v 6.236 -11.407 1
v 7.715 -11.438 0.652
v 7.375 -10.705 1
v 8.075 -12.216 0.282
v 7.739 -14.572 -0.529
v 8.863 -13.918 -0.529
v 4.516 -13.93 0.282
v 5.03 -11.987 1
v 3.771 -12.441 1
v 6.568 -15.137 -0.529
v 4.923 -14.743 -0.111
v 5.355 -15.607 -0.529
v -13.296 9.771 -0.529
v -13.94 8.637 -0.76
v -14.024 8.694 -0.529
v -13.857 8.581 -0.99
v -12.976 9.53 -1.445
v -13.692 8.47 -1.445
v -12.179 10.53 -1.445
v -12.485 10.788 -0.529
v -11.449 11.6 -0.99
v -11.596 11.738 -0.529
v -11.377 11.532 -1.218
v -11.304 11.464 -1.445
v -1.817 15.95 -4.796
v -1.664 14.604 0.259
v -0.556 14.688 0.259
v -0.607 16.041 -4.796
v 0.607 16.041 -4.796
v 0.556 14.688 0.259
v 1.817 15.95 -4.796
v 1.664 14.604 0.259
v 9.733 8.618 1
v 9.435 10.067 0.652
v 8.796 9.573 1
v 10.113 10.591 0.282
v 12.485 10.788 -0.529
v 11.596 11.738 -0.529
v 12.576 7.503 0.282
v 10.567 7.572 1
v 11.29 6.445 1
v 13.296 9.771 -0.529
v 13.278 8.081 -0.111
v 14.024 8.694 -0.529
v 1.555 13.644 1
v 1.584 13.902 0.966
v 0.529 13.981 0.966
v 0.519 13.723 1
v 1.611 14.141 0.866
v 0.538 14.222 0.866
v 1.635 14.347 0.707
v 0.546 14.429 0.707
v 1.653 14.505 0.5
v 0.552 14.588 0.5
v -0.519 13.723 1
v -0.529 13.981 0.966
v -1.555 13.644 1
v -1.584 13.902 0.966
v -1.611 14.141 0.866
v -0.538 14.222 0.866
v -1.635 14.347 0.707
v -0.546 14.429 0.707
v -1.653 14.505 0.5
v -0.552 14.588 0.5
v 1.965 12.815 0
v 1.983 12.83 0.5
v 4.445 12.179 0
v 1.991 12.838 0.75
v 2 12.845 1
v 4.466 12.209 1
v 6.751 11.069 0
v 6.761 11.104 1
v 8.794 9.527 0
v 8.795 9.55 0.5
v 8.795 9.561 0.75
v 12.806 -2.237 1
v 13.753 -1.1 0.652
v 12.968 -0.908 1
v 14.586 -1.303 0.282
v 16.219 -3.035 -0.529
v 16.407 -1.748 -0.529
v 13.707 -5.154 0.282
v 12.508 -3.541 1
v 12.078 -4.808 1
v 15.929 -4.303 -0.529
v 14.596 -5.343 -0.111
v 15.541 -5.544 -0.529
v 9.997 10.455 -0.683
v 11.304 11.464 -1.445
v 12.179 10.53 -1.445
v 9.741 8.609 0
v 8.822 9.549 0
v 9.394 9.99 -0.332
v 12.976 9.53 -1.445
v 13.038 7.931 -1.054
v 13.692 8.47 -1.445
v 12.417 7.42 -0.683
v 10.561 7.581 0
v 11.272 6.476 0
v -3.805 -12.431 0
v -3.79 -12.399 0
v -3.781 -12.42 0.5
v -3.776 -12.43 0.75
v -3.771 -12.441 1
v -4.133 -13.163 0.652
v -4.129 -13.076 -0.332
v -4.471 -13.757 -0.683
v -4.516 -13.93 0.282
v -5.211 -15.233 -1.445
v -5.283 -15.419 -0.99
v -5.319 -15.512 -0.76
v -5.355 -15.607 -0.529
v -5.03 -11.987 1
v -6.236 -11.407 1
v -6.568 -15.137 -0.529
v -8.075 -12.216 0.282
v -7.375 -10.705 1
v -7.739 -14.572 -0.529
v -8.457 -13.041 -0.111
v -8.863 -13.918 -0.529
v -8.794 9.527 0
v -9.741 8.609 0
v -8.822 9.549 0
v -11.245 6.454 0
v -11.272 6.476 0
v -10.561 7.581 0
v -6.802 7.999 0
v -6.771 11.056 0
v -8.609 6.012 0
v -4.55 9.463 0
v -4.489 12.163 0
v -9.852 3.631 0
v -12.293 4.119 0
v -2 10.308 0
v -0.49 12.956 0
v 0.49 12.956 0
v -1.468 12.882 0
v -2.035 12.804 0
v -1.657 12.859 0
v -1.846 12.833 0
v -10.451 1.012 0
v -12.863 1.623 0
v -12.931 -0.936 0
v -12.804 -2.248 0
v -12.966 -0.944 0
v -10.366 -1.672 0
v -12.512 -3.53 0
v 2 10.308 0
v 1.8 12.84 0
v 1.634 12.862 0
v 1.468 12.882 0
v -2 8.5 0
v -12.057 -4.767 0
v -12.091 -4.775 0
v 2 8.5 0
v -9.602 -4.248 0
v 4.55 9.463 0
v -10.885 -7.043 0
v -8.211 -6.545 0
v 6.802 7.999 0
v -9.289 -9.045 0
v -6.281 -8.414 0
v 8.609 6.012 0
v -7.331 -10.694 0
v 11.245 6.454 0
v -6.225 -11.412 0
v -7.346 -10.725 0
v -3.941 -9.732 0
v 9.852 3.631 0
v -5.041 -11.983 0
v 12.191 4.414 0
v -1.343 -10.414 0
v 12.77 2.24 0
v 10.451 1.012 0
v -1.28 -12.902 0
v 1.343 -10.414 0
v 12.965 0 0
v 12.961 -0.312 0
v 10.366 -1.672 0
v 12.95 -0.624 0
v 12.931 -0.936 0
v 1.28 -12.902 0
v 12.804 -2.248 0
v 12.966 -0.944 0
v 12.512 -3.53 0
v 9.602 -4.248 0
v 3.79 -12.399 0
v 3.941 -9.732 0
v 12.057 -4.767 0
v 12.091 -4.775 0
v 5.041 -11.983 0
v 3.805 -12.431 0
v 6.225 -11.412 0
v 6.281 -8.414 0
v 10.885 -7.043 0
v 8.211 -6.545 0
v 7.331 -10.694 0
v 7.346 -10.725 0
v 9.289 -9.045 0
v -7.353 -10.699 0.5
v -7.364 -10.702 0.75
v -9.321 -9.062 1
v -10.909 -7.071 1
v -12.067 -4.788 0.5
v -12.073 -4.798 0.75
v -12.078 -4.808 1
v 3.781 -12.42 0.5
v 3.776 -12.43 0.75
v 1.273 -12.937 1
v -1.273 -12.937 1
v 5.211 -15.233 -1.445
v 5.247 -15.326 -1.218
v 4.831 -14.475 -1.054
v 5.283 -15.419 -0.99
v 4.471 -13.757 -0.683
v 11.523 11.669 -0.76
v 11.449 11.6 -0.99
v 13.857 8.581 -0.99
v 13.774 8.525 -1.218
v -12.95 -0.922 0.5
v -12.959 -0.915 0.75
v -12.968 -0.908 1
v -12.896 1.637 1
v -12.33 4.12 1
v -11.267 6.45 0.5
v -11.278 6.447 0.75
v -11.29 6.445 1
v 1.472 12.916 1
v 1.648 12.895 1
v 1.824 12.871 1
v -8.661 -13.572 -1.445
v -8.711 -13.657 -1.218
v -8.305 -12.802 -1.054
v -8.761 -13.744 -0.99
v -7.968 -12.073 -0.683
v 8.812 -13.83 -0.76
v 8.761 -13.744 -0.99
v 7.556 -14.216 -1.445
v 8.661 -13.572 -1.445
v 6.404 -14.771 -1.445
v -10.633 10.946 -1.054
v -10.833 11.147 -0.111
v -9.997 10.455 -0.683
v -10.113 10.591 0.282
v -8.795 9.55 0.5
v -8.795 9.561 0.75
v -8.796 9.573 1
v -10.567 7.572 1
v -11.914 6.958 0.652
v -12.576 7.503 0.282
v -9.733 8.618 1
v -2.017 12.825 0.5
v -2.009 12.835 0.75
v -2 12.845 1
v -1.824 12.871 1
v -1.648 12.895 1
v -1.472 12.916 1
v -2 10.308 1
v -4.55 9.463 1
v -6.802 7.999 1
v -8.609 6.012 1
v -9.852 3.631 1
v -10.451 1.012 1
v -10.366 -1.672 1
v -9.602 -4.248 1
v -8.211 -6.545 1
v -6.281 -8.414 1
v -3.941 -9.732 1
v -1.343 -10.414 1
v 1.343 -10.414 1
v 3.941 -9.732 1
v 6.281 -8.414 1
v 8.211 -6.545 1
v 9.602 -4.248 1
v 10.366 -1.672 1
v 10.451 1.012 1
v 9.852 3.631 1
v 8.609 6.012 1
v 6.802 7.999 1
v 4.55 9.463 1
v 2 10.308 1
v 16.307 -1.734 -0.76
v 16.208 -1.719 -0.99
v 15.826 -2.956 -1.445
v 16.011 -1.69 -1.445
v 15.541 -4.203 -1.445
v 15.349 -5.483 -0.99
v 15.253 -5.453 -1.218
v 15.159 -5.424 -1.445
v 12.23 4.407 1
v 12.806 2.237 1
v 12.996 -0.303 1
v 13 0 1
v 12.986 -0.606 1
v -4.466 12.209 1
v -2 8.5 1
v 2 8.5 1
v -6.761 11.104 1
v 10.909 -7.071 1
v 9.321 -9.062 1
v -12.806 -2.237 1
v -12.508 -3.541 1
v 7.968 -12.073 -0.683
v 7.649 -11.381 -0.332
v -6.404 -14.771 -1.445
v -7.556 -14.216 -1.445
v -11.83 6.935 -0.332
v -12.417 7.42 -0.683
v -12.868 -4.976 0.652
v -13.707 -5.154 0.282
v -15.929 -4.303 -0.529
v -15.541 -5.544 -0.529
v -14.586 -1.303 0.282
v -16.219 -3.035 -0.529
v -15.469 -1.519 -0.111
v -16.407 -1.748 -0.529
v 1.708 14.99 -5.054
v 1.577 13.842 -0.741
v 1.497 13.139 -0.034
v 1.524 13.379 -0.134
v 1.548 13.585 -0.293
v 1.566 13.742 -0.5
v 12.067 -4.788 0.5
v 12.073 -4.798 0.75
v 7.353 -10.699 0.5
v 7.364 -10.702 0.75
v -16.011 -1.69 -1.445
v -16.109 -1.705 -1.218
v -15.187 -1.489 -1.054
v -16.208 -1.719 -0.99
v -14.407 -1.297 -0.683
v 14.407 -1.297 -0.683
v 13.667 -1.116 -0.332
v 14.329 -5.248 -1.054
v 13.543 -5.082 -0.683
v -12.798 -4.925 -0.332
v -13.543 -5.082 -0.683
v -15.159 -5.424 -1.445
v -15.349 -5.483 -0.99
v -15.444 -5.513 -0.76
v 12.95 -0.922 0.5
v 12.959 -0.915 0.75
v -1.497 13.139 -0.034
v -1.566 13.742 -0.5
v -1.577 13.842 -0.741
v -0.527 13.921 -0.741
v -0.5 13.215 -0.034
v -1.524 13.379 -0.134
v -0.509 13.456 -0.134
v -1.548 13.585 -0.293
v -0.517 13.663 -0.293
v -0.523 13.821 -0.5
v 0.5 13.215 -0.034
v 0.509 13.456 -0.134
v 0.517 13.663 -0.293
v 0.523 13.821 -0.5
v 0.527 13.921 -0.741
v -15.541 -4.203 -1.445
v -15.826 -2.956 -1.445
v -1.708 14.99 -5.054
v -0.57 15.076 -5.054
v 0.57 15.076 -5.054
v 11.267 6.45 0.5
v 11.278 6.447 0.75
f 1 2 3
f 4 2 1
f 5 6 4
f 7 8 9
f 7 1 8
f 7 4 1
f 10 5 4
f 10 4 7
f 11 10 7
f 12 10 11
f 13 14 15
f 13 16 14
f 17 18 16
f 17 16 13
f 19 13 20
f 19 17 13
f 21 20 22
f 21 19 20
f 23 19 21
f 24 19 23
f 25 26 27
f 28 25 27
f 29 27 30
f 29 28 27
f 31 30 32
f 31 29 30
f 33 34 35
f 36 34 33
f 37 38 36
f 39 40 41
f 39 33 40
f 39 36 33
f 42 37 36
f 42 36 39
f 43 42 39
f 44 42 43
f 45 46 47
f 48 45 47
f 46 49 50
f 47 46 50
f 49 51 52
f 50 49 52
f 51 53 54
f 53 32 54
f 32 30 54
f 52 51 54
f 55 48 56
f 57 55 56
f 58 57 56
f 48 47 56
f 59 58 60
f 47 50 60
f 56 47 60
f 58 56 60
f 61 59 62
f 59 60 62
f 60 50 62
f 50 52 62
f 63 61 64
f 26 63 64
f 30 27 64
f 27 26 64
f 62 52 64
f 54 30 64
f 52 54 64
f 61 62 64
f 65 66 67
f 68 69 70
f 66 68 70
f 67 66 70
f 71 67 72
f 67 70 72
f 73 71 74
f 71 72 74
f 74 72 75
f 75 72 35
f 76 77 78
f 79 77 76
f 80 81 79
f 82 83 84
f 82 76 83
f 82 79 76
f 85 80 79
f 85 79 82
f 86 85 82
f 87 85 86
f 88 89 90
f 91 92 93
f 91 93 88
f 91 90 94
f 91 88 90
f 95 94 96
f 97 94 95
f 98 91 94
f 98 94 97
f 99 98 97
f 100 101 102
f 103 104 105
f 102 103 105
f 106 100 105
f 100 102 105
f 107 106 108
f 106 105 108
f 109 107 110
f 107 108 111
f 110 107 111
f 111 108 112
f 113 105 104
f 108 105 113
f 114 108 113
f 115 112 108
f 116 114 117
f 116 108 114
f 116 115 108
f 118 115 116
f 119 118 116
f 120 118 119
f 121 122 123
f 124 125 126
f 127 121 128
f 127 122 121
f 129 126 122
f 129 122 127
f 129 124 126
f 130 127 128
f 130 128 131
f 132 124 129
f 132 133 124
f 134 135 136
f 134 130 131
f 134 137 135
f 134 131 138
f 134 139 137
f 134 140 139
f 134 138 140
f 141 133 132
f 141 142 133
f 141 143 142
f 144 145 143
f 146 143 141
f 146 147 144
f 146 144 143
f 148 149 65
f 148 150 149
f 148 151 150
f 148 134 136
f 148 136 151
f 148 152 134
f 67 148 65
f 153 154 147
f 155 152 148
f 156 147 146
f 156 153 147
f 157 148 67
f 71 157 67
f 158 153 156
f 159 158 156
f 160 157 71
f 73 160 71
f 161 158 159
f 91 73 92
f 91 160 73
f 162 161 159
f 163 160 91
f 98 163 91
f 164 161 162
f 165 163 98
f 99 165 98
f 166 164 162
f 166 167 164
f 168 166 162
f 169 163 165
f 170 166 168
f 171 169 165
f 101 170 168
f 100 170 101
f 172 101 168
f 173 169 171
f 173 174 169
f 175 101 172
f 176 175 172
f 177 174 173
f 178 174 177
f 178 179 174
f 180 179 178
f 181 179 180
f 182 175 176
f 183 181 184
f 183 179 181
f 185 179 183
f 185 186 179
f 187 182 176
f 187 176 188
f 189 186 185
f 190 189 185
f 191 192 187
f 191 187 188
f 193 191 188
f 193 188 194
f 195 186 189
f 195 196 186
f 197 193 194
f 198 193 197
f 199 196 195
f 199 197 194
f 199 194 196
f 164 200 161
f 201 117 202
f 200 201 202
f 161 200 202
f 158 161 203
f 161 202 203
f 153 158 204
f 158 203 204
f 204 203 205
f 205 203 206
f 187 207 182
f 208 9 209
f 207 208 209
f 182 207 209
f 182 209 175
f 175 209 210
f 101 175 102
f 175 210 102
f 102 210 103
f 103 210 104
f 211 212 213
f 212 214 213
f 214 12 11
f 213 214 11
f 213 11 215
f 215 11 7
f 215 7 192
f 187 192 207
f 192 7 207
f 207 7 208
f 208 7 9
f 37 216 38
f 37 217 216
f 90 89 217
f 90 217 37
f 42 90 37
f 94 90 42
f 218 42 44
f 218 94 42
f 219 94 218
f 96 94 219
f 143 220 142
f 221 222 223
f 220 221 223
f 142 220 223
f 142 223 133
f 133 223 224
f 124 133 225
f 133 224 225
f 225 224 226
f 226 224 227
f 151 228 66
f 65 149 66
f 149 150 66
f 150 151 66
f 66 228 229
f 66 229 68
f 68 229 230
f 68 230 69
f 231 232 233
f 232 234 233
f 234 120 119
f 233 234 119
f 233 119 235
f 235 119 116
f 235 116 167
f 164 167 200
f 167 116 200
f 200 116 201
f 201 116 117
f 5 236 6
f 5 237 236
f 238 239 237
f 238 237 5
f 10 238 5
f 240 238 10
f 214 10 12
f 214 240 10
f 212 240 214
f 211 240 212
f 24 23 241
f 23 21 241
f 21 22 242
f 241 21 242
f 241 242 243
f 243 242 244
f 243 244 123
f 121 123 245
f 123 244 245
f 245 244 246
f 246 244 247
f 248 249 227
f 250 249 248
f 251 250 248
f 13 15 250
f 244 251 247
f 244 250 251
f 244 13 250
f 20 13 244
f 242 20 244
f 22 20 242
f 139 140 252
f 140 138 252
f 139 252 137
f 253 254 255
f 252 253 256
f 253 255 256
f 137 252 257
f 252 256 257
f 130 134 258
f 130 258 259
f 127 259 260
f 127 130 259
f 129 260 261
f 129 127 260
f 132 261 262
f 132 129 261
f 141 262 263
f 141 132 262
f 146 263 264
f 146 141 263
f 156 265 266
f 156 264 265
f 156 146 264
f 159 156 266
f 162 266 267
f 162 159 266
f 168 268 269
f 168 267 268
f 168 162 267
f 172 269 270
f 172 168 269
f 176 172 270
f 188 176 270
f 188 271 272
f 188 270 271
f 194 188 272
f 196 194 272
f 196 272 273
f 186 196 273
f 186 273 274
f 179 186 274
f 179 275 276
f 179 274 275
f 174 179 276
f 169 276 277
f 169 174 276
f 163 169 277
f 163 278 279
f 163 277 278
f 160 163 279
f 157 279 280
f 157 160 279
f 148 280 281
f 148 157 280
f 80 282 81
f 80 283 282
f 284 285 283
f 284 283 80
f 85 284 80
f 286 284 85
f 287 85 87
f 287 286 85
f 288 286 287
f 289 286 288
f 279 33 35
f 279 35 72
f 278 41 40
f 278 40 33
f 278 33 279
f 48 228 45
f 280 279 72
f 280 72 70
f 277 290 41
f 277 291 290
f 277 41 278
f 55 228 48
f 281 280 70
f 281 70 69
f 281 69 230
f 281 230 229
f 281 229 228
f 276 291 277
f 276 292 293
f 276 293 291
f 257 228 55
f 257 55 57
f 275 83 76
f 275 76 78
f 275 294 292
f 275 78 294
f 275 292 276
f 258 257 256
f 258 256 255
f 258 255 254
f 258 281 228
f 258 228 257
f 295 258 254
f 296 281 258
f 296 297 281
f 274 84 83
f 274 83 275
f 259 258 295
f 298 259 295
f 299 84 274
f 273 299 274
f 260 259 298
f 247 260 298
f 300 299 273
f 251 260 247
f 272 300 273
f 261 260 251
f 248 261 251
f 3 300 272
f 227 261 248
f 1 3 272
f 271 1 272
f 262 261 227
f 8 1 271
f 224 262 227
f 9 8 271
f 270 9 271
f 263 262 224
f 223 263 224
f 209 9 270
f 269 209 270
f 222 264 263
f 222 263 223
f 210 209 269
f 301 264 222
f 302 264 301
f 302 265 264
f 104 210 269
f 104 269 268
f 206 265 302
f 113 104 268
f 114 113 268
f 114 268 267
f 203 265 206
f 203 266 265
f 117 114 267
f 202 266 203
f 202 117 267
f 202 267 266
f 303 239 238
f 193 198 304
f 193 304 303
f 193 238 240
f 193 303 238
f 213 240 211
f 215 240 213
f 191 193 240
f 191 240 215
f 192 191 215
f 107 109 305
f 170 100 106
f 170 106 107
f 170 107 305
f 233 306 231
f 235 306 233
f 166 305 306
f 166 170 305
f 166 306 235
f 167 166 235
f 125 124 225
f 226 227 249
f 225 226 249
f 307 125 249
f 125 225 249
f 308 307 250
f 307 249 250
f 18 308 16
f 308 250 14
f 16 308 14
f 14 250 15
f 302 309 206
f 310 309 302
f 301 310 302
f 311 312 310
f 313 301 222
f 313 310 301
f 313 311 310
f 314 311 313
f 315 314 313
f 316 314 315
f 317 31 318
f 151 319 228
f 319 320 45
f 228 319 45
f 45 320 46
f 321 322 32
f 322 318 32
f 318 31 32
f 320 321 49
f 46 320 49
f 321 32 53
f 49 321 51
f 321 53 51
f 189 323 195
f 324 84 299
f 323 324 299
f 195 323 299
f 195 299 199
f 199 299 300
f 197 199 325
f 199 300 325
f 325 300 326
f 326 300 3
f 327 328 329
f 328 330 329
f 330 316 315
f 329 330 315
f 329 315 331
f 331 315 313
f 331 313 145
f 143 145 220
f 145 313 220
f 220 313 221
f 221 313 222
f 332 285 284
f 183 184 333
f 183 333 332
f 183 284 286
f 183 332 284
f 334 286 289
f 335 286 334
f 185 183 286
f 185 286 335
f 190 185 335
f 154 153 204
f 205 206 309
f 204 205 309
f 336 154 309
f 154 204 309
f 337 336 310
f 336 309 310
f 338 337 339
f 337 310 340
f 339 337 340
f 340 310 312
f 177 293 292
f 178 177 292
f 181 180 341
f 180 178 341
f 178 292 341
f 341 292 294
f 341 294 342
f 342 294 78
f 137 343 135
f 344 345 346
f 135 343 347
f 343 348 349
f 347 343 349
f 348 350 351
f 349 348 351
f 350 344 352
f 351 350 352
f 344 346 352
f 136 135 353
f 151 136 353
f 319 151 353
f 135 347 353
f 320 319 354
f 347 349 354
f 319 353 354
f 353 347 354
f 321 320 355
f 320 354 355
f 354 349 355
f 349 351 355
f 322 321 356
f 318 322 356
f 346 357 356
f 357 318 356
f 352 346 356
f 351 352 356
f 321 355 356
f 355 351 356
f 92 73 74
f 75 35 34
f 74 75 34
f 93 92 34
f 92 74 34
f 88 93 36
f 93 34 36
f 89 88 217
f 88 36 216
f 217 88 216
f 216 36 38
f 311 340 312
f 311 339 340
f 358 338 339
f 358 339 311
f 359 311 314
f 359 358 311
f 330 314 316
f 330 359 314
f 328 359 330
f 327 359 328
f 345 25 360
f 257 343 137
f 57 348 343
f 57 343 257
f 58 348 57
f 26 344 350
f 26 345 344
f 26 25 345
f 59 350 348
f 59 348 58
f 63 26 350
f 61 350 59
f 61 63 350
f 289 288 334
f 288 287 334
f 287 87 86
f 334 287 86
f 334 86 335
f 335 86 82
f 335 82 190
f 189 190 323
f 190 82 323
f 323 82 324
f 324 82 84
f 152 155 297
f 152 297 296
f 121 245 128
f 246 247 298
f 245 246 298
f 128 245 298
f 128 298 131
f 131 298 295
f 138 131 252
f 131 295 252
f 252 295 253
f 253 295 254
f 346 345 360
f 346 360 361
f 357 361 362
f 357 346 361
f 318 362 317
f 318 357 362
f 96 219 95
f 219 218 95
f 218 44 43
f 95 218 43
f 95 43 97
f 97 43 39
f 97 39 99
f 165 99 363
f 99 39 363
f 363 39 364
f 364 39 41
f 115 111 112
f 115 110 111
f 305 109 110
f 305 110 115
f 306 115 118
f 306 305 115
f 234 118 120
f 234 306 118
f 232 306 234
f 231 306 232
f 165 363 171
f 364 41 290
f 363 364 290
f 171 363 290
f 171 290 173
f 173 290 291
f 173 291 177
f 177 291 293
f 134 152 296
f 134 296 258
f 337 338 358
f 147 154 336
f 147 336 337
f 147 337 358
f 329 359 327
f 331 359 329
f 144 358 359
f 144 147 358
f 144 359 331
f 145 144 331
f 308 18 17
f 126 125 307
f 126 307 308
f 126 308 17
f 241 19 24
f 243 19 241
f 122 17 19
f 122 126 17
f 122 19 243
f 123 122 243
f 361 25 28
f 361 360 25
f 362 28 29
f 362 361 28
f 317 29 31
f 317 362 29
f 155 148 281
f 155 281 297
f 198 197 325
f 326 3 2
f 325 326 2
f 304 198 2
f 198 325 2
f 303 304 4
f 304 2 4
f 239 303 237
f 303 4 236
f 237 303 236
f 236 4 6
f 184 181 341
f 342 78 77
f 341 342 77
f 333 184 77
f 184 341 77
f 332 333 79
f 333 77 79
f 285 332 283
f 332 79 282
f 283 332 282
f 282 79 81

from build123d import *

# Parameters (mm, degrees)
CUT_EXTRUDE2_DEPTH           = 24.379246777
CUT_EXTRUDE2_DEPTH_BACK      = 24.379246777
CUT_EXTRUDE4_DEPTH           = 10
CUT_EXTRUDE4_DRAFT           = 2
CUT_EXTRUDE4_PROFILE_2_DEPTH = 10
CUT_EXTRUDE4_PROFILE_2_DRAFT = 2
CUT_EXTRUDE4_PROFILE_3_DEPTH = 10
CUT_EXTRUDE4_PROFILE_3_DRAFT = 2
CUT_EXTRUDE4_PROFILE_4_DEPTH = 10
CUT_EXTRUDE4_PROFILE_4_DRAFT = 2
CUT_EXTRUDE4_PROFILE_5_DEPTH = 10
CUT_EXTRUDE4_PROFILE_5_DRAFT = 2
CUT_EXTRUDE4_PROFILE_6_DEPTH = 10
CUT_EXTRUDE4_PROFILE_6_DRAFT = 2
CUT_EXTRUDE4_PROFILE_7_DEPTH = 10
CUT_EXTRUDE4_PROFILE_7_DRAFT = 2
CUT_EXTRUDE4_PROFILE_8_DEPTH = 10
CUT_EXTRUDE4_PROFILE_8_DRAFT = 2
CUT_EXTRUDE4_PROFILE_9_DEPTH = 10
CUT_EXTRUDE4_PROFILE_9_DRAFT = 2
REVOLVE3_ANGLE               = 13
FILLET1_R                    = 1


with BuildPart() as part:
    # Sketch1 → Revolve1 (revolve)
    with BuildSketch(Plane(origin=(0, 0, 0), x_dir=(0, 0, -1), z_dir=(1, 0, 0)), mode=Mode.PRIVATE) as revolve1_sk:
        Polygon((-1, 7.5), (-1, 13), (0.529028795, 16.5), (1.445399555, 16.099669349), (0, 13), (0, 7.5), align=None)
    revolve(revolve1_sk.sketch.rotate(Axis((0, 0, 1), (0, 0, -1)), 90), axis=Axis((0, 0, 1), (0, 0, -1)))

    # Sketch2 → Cut-Extrude2 (cut, two sides: drawn at the far end of the back side and taken through both)
    with BuildSketch(Plane.XY.offset(-CUT_EXTRUDE2_DEPTH_BACK)):
        with BuildLine():
            Line((-2, 8.5), (-2, 10.307764064))
            ThreePointArc((-2, 10.307764064), (0, -10.5), (2, 10.307764064))
            Line((2, 10.307764064), (2, 8.5))
            Line((2, 8.5), (-2, 8.5))
        make_face()
    extrude(amount=CUT_EXTRUDE2_DEPTH + CUT_EXTRUDE2_DEPTH_BACK, mode=Mode.SUBTRACT)


with BuildPart() as cut_extrude4_tool:
    # Sketch3 → Cut-Extrude4 (with draft: the straight prism first)
    with BuildSketch(Plane.XY.offset(1)):
        with BuildLine():
            ThreePointArc((11.558121734, 11.775390524), (7.159081695, 14.86598632), (2, 16.378339354))
            Line((2, 16.378339354), (2, 12.845232579))
            ThreePointArc((2, 12.845232579), (5.640488609, 11.712595283), (8.795827626, 9.57253448))
            Line((8.795827626, 9.57253448), (11.558121734, 11.775390524))
        make_face()
    extrude(amount=-CUT_EXTRUDE4_DEPTH)
    # Cut-Extrude4: the draft: its side faces are tilted about the plane it starts from
    cut_extrude4_sides = [cut_extrude4_tool.faces().sort_by_distance(p)[0] for p in [
        (10.17697468, 10.673962502, -4),
        (7.159081695, 14.86598632, -4),
        (2, 14.611785966, -4),
        (5.640488609, 11.712595283, -4),
    ]]
    draft(cut_extrude4_sides, Plane.XY.offset(1), CUT_EXTRUDE4_DRAFT)


with BuildPart() as part_1:
    add(part.part)

    # Cut-Extrude4: cut by cut_extrude4_tool
    add(cut_extrude4_tool.part, mode=Mode.SUBTRACT)


with BuildPart() as cut_extrude4_profile_2_tool:
    # Sketch3 → Cut-Extrude4 profile 2 (with draft: the straight prism first)
    with BuildSketch(Plane.XY.offset(1)):
        with BuildLine():
            ThreePointArc((2, 16.378339354), (1.001848456, 16.469556754), (0, 16.5))
            Line((0, 16.5), (0, 13))
            ThreePointArc((0, 13), (1.00298965, 12.961250393), (2, 12.845232579))
            Line((2, 12.845232579), (2, 16.378339354))
        make_face()
    extrude(amount=-CUT_EXTRUDE4_PROFILE_2_DEPTH)
    # Cut-Extrude4 profile 2: the draft: its side faces are tilted about the plane it starts from
    cut_extrude4_profile_2_sides = [cut_extrude4_profile_2_tool.faces().sort_by_distance(p)[0] for p in [
        (2, 14.611785966, -4),
        (1.001848456, 16.469556754, -4),
        (0, 14.75, -4),
        (1.00298965, 12.961250393, -4),
    ]]
    draft(cut_extrude4_profile_2_sides, Plane.XY.offset(1), CUT_EXTRUDE4_PROFILE_2_DRAFT)


with BuildPart() as part_2:
    add(part_1.part)

    # Cut-Extrude4 profile 2: cut by cut_extrude4_profile_2_tool
    add(cut_extrude4_profile_2_tool.part, mode=Mode.SUBTRACT)


with BuildPart() as cut_extrude4_profile_3_tool:
    # Sketch3 → Cut-Extrude4 profile 3 (with draft: the straight prism first)
    with BuildSketch(Plane.XY.offset(1)):
        with BuildLine():
            Line((0, 13), (0, 16.5))
            ThreePointArc((0, 16.5), (-1.001848456, 16.469556754), (-2, 16.378339354))
            Line((-2, 16.378339354), (-2, 12.845232579))
            ThreePointArc((-2, 12.845232579), (-1.00298965, 12.961250393), (0, 13))
        make_face()
    extrude(amount=-CUT_EXTRUDE4_PROFILE_3_DEPTH)
    # Cut-Extrude4 profile 3: the draft: its side faces are tilted about the plane it starts from
    cut_extrude4_profile_3_sides = [cut_extrude4_profile_3_tool.faces().sort_by_distance(p)[0] for p in [
        (-1.00298965, 12.961250393, -4),
        (0, 14.75, -4),
        (-1.001848456, 16.469556754, -4),
        (-2, 14.611785966, -4),
    ]]
    draft(cut_extrude4_profile_3_sides, Plane.XY.offset(1), CUT_EXTRUDE4_PROFILE_3_DRAFT)


with BuildPart() as part_3:
    add(part_2.part)

    # Cut-Extrude4 profile 3: cut by cut_extrude4_profile_3_tool
    add(cut_extrude4_profile_3_tool.part, mode=Mode.SUBTRACT)


with BuildPart() as cut_extrude4_profile_4_tool:
    # Sketch3 → Cut-Extrude4 profile 4 (with draft: the straight prism first)
    with BuildSketch(Plane.XY.offset(1)):
        with BuildLine():
            Line((-2, 12.845232579), (-2, 16.378339354))
            ThreePointArc((-2, 16.378339354), (-7.159081695, 14.86598632), (-11.558121734, 11.775390524))
            Line((-11.558121734, 11.775390524), (-8.795827626, 9.57253448))
            ThreePointArc((-8.795827626, 9.57253448), (-5.640488609, 11.712595283), (-2, 12.845232579))
        make_face()
    extrude(amount=-CUT_EXTRUDE4_PROFILE_4_DEPTH)
    # Cut-Extrude4 profile 4: the draft: its side faces are tilted about the plane it starts from
    cut_extrude4_profile_4_sides = [cut_extrude4_profile_4_tool.faces().sort_by_distance(p)[0] for p in [
        (-10.17697468, 10.673962502, -4),
        (-5.640488609, 11.712595283, -4),
        (-2, 14.611785966, -4),
        (-7.159081695, 14.86598632, -4),
    ]]
    draft(cut_extrude4_profile_4_sides, Plane.XY.offset(1), CUT_EXTRUDE4_PROFILE_4_DRAFT)


with BuildPart() as part_4:
    add(part_3.part)

    # Cut-Extrude4 profile 4: cut by cut_extrude4_profile_4_tool
    add(cut_extrude4_profile_4_tool.part, mode=Mode.SUBTRACT)


with BuildPart() as cut_extrude4_profile_5_tool:
    # Sketch3 → Cut-Extrude4 profile 5 (with draft: the straight prism first)
    with BuildSketch(Plane.XY.offset(1)):
        with BuildLine():
            ThreePointArc((8.908232855, -13.888606388), (12.900219461, -10.287581731), (15.522658324, -5.594379194))
            Line((15.522658324, -5.594379194), (12.078133911, -4.808188975))
            ThreePointArc((12.078133911, -4.808188975), (10.163809272, -8.105367424), (7.375275277, -10.705387176))
            Line((7.375275277, -10.705387176), (8.908232855, -13.888606388))
        make_face()
    extrude(amount=-CUT_EXTRUDE4_PROFILE_5_DEPTH)
    # Cut-Extrude4 profile 5: the draft: its side faces are tilted about the plane it starts from
    cut_extrude4_profile_5_sides = [cut_extrude4_profile_5_tool.faces().sort_by_distance(p)[0] for p in [
        (12.900219461, -10.287581731, -4),
        (13.800396118, -5.201284084, -4),
        (10.163809272, -8.105367424, -4),
        (8.141754066, -12.296996782, -4),
    ]]
    draft(cut_extrude4_profile_5_sides, Plane.XY.offset(1), CUT_EXTRUDE4_PROFILE_5_DRAFT)


with BuildPart() as part_5:
    add(part_4.part)

    # Cut-Extrude4 profile 5: cut by cut_extrude4_profile_5_tool
    add(cut_extrude4_profile_5_tool.part, mode=Mode.SUBTRACT)


with BuildPart() as cut_extrude4_profile_6_tool:
    # Sketch3 → Cut-Extrude4 profile 6 (with draft: the straight prism first)
    with BuildSketch(Plane.XY.offset(1)):
        with BuildLine():
            Line((-3.771399805, -12.440922133), (-5.304357384, -15.624141344))
            ThreePointArc((-5.304357384, -15.624141344), (0, -16.5), (5.304357384, -15.624141344))
            Line((5.304357384, -15.624141344), (3.771399805, -12.440922133))
            ThreePointArc((3.771399805, -12.440922133), (0, -13), (-3.771399805, -12.440922133))
        make_face()
    extrude(amount=-CUT_EXTRUDE4_PROFILE_6_DEPTH)
    # Cut-Extrude4 profile 6: the draft: its side faces are tilted about the plane it starts from
    cut_extrude4_profile_6_sides = [cut_extrude4_profile_6_tool.faces().sort_by_distance(p)[0] for p in [
        (0, -16.5, -4),
        (4.537878594, -14.032531738, -4),
        (0, -13, -4),
        (-4.537878594, -14.032531738, -4),
    ]]
    draft(cut_extrude4_profile_6_sides, Plane.XY.offset(1), CUT_EXTRUDE4_PROFILE_6_DRAFT)


with BuildPart() as part_6:
    add(part_5.part)

    # Cut-Extrude4 profile 6: cut by cut_extrude4_profile_6_tool
    add(cut_extrude4_profile_6_tool.part, mode=Mode.SUBTRACT)


with BuildPart() as cut_extrude4_profile_7_tool:
    # Sketch3 → Cut-Extrude4 profile 7 (with draft: the straight prism first)
    with BuildSketch(Plane.XY.offset(1)):
        with BuildLine():
            Line((-12.078133911, -4.808188975), (-15.522658324, -5.594379194))
            ThreePointArc((-15.522658324, -5.594379194), (-12.900219461, -10.287581731), (-8.908232855, -13.888606388))
            Line((-8.908232855, -13.888606388), (-7.375275277, -10.705387176))
            ThreePointArc((-7.375275277, -10.705387176), (-10.163809272, -8.105367424), (-12.078133911, -4.808188975))
        make_face()
    extrude(amount=-CUT_EXTRUDE4_PROFILE_7_DEPTH)
    # Cut-Extrude4 profile 7: the draft: its side faces are tilted about the plane it starts from
    cut_extrude4_profile_7_sides = [cut_extrude4_profile_7_tool.faces().sort_by_distance(p)[0] for p in [
        (-13.800396118, -5.201284084, -4),
        (-12.900219461, -10.287581731, -4),
        (-8.141754066, -12.296996782, -4),
        (-10.163809272, -8.105367424, -4),
    ]]
    draft(cut_extrude4_profile_7_sides, Plane.XY.offset(1), CUT_EXTRUDE4_PROFILE_7_DRAFT)


with BuildPart() as part_7:
    add(part_6.part)

    # Cut-Extrude4 profile 7: cut by cut_extrude4_profile_7_tool
    add(cut_extrude4_profile_7_tool.part, mode=Mode.SUBTRACT)


with BuildPart() as cut_extrude4_profile_8_tool:
    # Sketch3 → Cut-Extrude4 profile 8 (with draft: the straight prism first)
    with BuildSketch(Plane.XY.offset(1)):
        with BuildLine():
            ThreePointArc((16.5, 0), (15.876229646, 4.493921699), (14.052080941, 8.648064594))
            Line((14.052080941, 8.648064594), (11.289786833, 6.44520855))
            ThreePointArc((11.289786833, 6.44520855), (12.565174667, 3.33412441), (13, 0))
            ThreePointArc((13, 0), (12.992051982, -0.454516548), (12.968217647, -0.908477326))
            Line((12.968217647, -0.908477326), (16.412742059, -1.694667545))
            ThreePointArc((16.412742059, -1.694667545), (16.478171075, -0.848456251), (16.5, 0))
        make_face()
    extrude(amount=-CUT_EXTRUDE4_PROFILE_8_DEPTH)
    # Cut-Extrude4 profile 8: the draft: its side faces are tilted about the plane it starts from
    cut_extrude4_profile_8_sides = [cut_extrude4_profile_8_tool.faces().sort_by_distance(p)[0] for p in [
        (16.086310551, 3.67159541, -4),
        (12.674062858, 2.892772141, -4),
        (12.670933887, 7.546636572, -4),
        (14.690479853, -1.301572436, -4),
    ]]
    draft(cut_extrude4_profile_8_sides, Plane.XY.offset(1), CUT_EXTRUDE4_PROFILE_8_DRAFT)


with BuildPart() as part_8:
    add(part_7.part)

    # Cut-Extrude4 profile 8: cut by cut_extrude4_profile_8_tool
    add(cut_extrude4_profile_8_tool.part, mode=Mode.SUBTRACT)


with BuildPart() as cut_extrude4_profile_9_tool:
    # Sketch3 → Cut-Extrude4 profile 9 (with draft: the straight prism first)
    with BuildSketch(Plane.XY.offset(1)):
        with BuildLine():
            Line((-11.289786833, 6.44520855), (-14.052080941, 8.648064594))
            ThreePointArc((-14.052080941, 8.648064594), (-16.086310551, 3.67159541), (-16.412742059, -1.694667545))
            Line((-16.412742059, -1.694667545), (-12.968217647, -0.908477326))
            ThreePointArc((-12.968217647, -0.908477326), (-12.674062858, 2.892772141), (-11.289786833, 6.44520855))
        make_face()
    extrude(amount=-CUT_EXTRUDE4_PROFILE_9_DEPTH)
    # Cut-Extrude4 profile 9: the draft: its side faces are tilted about the plane it starts from
    cut_extrude4_profile_9_sides = [cut_extrude4_profile_9_tool.faces().sort_by_distance(p)[0] for p in [
        (-16.086310551, 3.67159541, -4),
        (-14.690479853, -1.301572436, -4),
        (-12.674062858, 2.892772141, -4),
        (-12.670933887, 7.546636572, -4),
    ]]
    draft(cut_extrude4_profile_9_sides, Plane.XY.offset(1), CUT_EXTRUDE4_PROFILE_9_DRAFT)


with BuildPart() as part_9:
    add(part_8.part)

    # Cut-Extrude4 profile 9: cut by cut_extrude4_profile_9_tool
    add(cut_extrude4_profile_9_tool.part, mode=Mode.SUBTRACT)

    # Sketch4 → Revolve3 (revolve, symmetric)
    with BuildSketch(Plane(origin=(0, 0, 0), x_dir=(0, 0, -1), z_dir=(1, 0, 0))) as revolve3_sk:
        Polygon((-1, 10), (-1, 14.5), (4.795554958, 16.052914271), (5.054374003, 15.086988444), (0, 13.732673012), (0, 10), align=None)
    revolve(axis=Axis((0, 0, 1), (0, 0, -1)), revolution_arc=REVOLVE3_ANGLE / 2)
    revolve(revolve3_sk.sketch, axis=Axis((0, 0, 1), (0, 0, 1)), revolution_arc=REVOLVE3_ANGLE / 2)

    # Fillet1
    fillet1_edges = [part_9.edges().sort_by_distance(p)[0] for p in [
        (0, 14.5, 1),
        (0, 13.732673012, 0),
    ]]
    fillet(fillet1_edges, radius=FILLET1_R)


solid = part_9.part
